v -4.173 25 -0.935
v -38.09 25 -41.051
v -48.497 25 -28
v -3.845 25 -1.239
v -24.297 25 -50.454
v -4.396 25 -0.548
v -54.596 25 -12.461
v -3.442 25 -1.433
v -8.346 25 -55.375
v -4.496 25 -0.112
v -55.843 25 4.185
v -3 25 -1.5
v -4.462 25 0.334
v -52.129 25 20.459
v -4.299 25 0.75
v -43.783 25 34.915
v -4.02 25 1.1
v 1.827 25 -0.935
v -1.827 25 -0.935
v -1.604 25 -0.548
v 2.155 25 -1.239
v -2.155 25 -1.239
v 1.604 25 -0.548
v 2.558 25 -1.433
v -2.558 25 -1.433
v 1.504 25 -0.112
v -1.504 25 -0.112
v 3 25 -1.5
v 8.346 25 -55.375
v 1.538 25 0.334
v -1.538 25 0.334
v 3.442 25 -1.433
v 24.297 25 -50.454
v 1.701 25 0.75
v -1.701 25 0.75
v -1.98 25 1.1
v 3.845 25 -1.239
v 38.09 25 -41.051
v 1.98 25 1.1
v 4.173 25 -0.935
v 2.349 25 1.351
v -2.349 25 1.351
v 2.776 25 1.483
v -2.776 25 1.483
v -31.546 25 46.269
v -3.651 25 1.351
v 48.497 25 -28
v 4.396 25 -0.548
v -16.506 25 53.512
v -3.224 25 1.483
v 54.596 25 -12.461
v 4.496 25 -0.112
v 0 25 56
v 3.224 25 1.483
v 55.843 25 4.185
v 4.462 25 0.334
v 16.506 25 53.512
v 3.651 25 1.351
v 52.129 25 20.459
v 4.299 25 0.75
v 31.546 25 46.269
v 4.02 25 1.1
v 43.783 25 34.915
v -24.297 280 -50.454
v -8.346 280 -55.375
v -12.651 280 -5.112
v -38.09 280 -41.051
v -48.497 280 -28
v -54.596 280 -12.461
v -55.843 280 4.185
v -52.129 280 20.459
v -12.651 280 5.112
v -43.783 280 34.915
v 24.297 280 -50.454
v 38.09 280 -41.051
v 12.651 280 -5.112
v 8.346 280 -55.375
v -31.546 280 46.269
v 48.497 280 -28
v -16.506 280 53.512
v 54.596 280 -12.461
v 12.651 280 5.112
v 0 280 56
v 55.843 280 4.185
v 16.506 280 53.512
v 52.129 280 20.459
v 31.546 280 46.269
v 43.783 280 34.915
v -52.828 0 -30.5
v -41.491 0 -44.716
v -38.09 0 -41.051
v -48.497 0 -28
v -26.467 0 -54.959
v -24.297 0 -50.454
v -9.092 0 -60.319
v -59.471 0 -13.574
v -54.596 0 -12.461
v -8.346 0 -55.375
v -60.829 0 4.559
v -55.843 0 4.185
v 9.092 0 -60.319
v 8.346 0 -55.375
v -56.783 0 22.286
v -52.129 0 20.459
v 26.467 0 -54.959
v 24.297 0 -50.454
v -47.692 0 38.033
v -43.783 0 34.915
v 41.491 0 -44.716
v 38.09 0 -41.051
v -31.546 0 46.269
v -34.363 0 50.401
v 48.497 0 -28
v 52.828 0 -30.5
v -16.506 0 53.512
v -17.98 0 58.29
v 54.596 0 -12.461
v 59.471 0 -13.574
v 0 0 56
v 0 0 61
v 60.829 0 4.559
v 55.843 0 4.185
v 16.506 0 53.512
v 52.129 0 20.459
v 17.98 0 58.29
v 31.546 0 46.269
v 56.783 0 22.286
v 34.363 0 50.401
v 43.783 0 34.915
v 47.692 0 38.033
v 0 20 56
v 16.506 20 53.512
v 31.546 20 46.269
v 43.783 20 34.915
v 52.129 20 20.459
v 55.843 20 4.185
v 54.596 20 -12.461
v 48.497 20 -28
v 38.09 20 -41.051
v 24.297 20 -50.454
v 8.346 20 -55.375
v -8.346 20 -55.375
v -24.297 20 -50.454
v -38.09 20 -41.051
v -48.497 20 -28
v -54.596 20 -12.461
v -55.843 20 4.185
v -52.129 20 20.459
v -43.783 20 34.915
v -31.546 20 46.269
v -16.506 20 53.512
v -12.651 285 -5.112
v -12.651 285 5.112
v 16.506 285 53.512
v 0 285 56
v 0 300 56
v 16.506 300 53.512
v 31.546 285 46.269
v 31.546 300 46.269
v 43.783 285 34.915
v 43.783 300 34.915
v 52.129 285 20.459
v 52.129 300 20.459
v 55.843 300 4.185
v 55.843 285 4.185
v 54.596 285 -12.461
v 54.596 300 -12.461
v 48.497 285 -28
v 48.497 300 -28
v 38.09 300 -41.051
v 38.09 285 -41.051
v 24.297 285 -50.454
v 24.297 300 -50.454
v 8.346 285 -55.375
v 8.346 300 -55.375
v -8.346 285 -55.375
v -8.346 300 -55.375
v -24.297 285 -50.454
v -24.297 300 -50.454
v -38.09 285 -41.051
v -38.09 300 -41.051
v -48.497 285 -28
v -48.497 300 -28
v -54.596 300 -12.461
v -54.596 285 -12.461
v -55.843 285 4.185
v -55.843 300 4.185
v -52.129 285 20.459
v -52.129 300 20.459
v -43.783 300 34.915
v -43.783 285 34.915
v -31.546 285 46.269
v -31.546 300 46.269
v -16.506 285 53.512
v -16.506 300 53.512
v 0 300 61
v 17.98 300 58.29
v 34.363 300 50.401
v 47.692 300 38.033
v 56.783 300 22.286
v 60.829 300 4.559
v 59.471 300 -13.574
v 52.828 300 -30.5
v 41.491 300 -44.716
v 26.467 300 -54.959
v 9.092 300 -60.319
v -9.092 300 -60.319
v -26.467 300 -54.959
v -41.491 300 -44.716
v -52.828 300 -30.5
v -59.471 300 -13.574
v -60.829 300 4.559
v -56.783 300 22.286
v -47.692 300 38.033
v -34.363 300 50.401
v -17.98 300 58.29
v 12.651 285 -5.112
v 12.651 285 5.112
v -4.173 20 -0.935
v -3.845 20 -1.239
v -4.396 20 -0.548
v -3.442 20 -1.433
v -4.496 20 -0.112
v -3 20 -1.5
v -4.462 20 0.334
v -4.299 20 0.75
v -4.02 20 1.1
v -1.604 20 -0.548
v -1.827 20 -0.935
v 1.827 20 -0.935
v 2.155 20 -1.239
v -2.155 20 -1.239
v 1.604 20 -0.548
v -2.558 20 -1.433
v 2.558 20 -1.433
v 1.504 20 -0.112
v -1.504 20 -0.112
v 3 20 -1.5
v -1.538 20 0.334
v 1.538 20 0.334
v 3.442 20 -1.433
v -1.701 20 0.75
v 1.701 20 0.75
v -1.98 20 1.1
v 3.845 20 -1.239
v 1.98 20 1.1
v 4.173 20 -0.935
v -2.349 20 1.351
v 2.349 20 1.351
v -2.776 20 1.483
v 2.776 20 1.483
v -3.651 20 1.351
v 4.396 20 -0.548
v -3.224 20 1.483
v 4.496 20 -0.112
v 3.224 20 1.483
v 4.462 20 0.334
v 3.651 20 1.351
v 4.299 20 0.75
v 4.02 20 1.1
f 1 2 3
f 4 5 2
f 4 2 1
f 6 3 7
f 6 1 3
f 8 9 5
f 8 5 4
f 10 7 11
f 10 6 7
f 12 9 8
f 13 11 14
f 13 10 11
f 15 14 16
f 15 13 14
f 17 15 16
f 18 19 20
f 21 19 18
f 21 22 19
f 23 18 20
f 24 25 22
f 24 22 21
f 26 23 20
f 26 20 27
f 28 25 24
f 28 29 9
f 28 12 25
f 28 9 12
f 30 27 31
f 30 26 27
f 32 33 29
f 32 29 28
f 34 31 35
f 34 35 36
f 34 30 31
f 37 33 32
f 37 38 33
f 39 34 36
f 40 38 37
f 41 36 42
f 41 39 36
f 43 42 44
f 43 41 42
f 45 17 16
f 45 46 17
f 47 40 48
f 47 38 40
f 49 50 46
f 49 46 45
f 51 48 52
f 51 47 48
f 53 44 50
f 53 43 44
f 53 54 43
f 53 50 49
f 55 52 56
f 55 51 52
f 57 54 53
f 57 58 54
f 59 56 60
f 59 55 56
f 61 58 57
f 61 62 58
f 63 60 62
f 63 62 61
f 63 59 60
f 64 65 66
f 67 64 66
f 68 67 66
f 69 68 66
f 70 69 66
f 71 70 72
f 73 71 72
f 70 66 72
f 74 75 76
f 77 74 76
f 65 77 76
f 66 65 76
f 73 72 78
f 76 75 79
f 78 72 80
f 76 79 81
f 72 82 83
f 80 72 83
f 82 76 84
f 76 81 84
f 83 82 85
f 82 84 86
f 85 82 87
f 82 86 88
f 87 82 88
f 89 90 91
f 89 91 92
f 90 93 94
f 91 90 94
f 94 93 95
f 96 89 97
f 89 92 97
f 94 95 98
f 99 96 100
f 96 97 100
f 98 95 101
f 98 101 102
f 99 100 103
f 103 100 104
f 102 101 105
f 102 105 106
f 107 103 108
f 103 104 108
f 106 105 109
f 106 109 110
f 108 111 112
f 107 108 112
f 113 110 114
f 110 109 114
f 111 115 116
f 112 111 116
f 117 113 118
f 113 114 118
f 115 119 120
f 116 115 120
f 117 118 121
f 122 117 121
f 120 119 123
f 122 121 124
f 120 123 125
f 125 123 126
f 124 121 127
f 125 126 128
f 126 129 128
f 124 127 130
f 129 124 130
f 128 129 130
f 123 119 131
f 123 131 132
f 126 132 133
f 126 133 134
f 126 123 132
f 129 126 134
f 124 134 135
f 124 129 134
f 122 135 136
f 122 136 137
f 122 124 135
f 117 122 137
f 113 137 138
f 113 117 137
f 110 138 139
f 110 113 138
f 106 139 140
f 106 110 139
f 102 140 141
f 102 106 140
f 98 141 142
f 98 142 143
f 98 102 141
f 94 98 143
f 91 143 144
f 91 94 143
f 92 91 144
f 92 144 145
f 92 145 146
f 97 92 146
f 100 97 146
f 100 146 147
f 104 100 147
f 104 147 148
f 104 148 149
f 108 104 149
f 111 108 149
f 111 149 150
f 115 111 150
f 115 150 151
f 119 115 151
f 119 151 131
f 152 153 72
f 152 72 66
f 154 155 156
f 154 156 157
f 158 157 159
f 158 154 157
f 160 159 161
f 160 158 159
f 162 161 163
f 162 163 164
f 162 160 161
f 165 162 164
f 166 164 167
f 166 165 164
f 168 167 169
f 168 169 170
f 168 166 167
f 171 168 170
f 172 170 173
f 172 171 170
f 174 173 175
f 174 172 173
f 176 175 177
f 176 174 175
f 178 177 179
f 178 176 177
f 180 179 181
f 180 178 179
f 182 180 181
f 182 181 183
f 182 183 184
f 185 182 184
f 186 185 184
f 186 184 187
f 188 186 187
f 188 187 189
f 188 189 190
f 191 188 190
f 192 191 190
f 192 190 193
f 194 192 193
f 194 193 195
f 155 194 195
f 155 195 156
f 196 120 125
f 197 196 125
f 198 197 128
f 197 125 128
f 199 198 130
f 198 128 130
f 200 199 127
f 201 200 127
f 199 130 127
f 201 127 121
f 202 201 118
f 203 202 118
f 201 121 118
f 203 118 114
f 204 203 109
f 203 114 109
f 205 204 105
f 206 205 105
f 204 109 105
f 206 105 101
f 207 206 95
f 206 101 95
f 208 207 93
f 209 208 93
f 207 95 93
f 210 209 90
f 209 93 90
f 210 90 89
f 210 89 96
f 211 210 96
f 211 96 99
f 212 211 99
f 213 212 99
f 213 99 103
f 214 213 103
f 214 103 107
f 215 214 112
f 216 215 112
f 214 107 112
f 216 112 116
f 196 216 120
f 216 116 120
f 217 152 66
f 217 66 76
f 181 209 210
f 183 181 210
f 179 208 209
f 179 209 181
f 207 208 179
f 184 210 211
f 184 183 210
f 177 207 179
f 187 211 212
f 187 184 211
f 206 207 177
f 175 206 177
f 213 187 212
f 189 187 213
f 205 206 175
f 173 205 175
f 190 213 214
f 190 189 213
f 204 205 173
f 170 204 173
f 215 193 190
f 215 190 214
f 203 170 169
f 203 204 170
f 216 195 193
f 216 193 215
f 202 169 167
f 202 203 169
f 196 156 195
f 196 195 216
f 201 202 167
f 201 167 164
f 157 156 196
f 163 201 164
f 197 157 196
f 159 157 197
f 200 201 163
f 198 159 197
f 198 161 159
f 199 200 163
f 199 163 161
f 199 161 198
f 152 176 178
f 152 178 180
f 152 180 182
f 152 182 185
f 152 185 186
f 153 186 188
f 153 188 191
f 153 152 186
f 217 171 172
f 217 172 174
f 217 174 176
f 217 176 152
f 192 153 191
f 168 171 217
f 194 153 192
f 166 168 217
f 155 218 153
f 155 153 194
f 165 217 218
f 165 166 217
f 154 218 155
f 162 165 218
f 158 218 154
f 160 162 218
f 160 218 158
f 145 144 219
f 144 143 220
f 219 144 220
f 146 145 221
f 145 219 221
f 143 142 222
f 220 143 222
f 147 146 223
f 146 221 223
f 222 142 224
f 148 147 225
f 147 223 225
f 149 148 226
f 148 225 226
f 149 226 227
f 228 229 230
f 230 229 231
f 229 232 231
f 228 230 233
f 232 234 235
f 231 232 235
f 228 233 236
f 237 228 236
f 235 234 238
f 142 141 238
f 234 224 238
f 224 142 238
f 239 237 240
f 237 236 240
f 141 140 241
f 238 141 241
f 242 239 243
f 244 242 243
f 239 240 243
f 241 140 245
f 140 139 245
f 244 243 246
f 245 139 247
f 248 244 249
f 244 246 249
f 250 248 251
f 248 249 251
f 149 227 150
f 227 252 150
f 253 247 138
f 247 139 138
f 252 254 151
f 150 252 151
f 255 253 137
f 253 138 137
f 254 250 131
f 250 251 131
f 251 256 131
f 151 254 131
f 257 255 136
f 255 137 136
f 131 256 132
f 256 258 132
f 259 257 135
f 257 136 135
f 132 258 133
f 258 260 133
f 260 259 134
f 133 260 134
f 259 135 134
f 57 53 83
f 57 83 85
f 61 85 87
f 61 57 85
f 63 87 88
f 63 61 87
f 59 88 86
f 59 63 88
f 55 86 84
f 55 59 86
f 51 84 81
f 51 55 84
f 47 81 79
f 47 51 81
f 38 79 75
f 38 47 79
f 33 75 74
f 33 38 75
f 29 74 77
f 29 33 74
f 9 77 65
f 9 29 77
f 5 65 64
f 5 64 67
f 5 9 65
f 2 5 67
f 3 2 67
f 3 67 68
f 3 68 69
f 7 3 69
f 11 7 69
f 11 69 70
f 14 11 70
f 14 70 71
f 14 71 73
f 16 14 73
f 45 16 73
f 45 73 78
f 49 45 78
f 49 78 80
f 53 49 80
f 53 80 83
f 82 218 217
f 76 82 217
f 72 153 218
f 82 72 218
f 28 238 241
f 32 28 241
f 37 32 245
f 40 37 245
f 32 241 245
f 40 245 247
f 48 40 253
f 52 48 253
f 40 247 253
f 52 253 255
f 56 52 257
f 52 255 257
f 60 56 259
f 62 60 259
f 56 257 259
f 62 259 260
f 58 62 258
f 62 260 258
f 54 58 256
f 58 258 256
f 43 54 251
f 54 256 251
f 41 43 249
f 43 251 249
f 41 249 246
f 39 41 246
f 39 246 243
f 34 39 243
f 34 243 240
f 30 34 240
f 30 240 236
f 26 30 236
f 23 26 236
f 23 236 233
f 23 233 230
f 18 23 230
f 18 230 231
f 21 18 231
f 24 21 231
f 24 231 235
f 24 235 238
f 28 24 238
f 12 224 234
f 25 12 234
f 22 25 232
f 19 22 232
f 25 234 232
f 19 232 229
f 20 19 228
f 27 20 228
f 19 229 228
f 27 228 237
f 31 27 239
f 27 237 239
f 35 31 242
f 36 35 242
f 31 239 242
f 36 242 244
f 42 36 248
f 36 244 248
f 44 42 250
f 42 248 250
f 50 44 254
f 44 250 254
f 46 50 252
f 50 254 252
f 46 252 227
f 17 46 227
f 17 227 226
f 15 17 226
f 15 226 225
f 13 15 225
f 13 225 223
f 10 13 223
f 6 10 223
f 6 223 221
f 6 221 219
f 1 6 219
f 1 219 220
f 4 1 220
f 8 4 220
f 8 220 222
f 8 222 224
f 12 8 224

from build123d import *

# Parameters (mm, degrees)
SKETCH1_R           = 61
SKETCH1_R_2         = 56
BOSS_EXTRUDE1_DEPTH = 300
SKETCH3_R           = 56
BOSS_EXTRUDE2_DEPTH = 5
CUT_EXTRUDE1_REACH  = 294.988
SKETCH4_R           = 1.5
SKETCH5_R           = 56
BOSS_EXTRUDE3_DEPTH = 5
CUT_EXTRUDE2_REACH  = 299.77
SKETCH6_W           = 25.301187414
SKETCH6_H           = 10.224452448


with BuildPart() as part:
    # Sketch1 → Boss-Extrude1 (new body)
    with BuildSketch(Plane(origin=(0, 0, 0), x_dir=(1, 0, 0), z_dir=(0, 1, 0))):
        with Locations(Location((0, 0, 0), (0, 0, 270))):
            Circle(SKETCH1_R)
        with Locations(Location((0, 0, 0), (0, 0, 270))):
            Circle(SKETCH1_R_2, mode=Mode.SUBTRACT)
    extrude(amount=BOSS_EXTRUDE1_DEPTH)

    # Sketch3 → Boss-Extrude2 (add)
    with BuildSketch(Plane(origin=(0, 20, 0), x_dir=(1, 0, 0), z_dir=(0, 1, 0))):
        with Locations(Location((0, 0, 0), (0, 0, 270))):
            Circle(SKETCH3_R)
    extrude(amount=BOSS_EXTRUDE2_DEPTH)

    # Sketch4 → Cut-Extrude1 (cut, up to next)
    with BuildSketch(Plane.XZ.offset(-20), mode=Mode.PRIVATE) as cut_extrude1_sk1:
        with Locations(Location((-3, 0, 0), (0, 0, 270))):
            Circle(SKETCH4_R)
    cut_extrude1_tool1 = extrude(cut_extrude1_sk1.sketch, amount=-CUT_EXTRUDE1_REACH, mode=Mode.PRIVATE) & part.part
    # Sketch4 → Cut-Extrude1 (cut, up to next)
    with BuildSketch(Plane.XZ.offset(-20), mode=Mode.PRIVATE) as cut_extrude1_sk2:
        with Locations(Location((3, 0, 0), (0, 0, 270))):
            Circle(SKETCH4_R)
    cut_extrude1_tool2 = extrude(cut_extrude1_sk2.sketch, amount=-CUT_EXTRUDE1_REACH, mode=Mode.PRIVATE) & part.part
    add(cut_extrude1_tool1.solids().sort_by_distance((-3, 20, 0))[0], mode=Mode.SUBTRACT)
    add(cut_extrude1_tool2.solids().sort_by_distance((3, 20, 0))[0], mode=Mode.SUBTRACT)

    # Sketch5 → Boss-Extrude3 (add)
    with BuildSketch(Plane(origin=(0, 280, 0), x_dir=(1, 0, 0), z_dir=(0, 1, 0))):
        with Locations(Location((0, 0, 0), (0, 0, 270))):
            Circle(SKETCH5_R)
    extrude(amount=BOSS_EXTRUDE3_DEPTH)

    # Sketch6 → Cut-Extrude2 (cut, up to next)
    with BuildSketch(Plane(origin=(0, 285, 0), x_dir=(1, 0, 0), z_dir=(0, 1, 0)), mode=Mode.PRIVATE) as cut_extrude2_sk1:
        Rectangle(SKETCH6_W, SKETCH6_H)
    cut_extrude2_tool1 = extrude(cut_extrude2_sk1.sketch, amount=-CUT_EXTRUDE2_REACH, mode=Mode.PRIVATE) & part.part
    add(cut_extrude2_tool1.solids().sort_by_distance((0, 285, 0))[0], mode=Mode.SUBTRACT)


solid = part.part
